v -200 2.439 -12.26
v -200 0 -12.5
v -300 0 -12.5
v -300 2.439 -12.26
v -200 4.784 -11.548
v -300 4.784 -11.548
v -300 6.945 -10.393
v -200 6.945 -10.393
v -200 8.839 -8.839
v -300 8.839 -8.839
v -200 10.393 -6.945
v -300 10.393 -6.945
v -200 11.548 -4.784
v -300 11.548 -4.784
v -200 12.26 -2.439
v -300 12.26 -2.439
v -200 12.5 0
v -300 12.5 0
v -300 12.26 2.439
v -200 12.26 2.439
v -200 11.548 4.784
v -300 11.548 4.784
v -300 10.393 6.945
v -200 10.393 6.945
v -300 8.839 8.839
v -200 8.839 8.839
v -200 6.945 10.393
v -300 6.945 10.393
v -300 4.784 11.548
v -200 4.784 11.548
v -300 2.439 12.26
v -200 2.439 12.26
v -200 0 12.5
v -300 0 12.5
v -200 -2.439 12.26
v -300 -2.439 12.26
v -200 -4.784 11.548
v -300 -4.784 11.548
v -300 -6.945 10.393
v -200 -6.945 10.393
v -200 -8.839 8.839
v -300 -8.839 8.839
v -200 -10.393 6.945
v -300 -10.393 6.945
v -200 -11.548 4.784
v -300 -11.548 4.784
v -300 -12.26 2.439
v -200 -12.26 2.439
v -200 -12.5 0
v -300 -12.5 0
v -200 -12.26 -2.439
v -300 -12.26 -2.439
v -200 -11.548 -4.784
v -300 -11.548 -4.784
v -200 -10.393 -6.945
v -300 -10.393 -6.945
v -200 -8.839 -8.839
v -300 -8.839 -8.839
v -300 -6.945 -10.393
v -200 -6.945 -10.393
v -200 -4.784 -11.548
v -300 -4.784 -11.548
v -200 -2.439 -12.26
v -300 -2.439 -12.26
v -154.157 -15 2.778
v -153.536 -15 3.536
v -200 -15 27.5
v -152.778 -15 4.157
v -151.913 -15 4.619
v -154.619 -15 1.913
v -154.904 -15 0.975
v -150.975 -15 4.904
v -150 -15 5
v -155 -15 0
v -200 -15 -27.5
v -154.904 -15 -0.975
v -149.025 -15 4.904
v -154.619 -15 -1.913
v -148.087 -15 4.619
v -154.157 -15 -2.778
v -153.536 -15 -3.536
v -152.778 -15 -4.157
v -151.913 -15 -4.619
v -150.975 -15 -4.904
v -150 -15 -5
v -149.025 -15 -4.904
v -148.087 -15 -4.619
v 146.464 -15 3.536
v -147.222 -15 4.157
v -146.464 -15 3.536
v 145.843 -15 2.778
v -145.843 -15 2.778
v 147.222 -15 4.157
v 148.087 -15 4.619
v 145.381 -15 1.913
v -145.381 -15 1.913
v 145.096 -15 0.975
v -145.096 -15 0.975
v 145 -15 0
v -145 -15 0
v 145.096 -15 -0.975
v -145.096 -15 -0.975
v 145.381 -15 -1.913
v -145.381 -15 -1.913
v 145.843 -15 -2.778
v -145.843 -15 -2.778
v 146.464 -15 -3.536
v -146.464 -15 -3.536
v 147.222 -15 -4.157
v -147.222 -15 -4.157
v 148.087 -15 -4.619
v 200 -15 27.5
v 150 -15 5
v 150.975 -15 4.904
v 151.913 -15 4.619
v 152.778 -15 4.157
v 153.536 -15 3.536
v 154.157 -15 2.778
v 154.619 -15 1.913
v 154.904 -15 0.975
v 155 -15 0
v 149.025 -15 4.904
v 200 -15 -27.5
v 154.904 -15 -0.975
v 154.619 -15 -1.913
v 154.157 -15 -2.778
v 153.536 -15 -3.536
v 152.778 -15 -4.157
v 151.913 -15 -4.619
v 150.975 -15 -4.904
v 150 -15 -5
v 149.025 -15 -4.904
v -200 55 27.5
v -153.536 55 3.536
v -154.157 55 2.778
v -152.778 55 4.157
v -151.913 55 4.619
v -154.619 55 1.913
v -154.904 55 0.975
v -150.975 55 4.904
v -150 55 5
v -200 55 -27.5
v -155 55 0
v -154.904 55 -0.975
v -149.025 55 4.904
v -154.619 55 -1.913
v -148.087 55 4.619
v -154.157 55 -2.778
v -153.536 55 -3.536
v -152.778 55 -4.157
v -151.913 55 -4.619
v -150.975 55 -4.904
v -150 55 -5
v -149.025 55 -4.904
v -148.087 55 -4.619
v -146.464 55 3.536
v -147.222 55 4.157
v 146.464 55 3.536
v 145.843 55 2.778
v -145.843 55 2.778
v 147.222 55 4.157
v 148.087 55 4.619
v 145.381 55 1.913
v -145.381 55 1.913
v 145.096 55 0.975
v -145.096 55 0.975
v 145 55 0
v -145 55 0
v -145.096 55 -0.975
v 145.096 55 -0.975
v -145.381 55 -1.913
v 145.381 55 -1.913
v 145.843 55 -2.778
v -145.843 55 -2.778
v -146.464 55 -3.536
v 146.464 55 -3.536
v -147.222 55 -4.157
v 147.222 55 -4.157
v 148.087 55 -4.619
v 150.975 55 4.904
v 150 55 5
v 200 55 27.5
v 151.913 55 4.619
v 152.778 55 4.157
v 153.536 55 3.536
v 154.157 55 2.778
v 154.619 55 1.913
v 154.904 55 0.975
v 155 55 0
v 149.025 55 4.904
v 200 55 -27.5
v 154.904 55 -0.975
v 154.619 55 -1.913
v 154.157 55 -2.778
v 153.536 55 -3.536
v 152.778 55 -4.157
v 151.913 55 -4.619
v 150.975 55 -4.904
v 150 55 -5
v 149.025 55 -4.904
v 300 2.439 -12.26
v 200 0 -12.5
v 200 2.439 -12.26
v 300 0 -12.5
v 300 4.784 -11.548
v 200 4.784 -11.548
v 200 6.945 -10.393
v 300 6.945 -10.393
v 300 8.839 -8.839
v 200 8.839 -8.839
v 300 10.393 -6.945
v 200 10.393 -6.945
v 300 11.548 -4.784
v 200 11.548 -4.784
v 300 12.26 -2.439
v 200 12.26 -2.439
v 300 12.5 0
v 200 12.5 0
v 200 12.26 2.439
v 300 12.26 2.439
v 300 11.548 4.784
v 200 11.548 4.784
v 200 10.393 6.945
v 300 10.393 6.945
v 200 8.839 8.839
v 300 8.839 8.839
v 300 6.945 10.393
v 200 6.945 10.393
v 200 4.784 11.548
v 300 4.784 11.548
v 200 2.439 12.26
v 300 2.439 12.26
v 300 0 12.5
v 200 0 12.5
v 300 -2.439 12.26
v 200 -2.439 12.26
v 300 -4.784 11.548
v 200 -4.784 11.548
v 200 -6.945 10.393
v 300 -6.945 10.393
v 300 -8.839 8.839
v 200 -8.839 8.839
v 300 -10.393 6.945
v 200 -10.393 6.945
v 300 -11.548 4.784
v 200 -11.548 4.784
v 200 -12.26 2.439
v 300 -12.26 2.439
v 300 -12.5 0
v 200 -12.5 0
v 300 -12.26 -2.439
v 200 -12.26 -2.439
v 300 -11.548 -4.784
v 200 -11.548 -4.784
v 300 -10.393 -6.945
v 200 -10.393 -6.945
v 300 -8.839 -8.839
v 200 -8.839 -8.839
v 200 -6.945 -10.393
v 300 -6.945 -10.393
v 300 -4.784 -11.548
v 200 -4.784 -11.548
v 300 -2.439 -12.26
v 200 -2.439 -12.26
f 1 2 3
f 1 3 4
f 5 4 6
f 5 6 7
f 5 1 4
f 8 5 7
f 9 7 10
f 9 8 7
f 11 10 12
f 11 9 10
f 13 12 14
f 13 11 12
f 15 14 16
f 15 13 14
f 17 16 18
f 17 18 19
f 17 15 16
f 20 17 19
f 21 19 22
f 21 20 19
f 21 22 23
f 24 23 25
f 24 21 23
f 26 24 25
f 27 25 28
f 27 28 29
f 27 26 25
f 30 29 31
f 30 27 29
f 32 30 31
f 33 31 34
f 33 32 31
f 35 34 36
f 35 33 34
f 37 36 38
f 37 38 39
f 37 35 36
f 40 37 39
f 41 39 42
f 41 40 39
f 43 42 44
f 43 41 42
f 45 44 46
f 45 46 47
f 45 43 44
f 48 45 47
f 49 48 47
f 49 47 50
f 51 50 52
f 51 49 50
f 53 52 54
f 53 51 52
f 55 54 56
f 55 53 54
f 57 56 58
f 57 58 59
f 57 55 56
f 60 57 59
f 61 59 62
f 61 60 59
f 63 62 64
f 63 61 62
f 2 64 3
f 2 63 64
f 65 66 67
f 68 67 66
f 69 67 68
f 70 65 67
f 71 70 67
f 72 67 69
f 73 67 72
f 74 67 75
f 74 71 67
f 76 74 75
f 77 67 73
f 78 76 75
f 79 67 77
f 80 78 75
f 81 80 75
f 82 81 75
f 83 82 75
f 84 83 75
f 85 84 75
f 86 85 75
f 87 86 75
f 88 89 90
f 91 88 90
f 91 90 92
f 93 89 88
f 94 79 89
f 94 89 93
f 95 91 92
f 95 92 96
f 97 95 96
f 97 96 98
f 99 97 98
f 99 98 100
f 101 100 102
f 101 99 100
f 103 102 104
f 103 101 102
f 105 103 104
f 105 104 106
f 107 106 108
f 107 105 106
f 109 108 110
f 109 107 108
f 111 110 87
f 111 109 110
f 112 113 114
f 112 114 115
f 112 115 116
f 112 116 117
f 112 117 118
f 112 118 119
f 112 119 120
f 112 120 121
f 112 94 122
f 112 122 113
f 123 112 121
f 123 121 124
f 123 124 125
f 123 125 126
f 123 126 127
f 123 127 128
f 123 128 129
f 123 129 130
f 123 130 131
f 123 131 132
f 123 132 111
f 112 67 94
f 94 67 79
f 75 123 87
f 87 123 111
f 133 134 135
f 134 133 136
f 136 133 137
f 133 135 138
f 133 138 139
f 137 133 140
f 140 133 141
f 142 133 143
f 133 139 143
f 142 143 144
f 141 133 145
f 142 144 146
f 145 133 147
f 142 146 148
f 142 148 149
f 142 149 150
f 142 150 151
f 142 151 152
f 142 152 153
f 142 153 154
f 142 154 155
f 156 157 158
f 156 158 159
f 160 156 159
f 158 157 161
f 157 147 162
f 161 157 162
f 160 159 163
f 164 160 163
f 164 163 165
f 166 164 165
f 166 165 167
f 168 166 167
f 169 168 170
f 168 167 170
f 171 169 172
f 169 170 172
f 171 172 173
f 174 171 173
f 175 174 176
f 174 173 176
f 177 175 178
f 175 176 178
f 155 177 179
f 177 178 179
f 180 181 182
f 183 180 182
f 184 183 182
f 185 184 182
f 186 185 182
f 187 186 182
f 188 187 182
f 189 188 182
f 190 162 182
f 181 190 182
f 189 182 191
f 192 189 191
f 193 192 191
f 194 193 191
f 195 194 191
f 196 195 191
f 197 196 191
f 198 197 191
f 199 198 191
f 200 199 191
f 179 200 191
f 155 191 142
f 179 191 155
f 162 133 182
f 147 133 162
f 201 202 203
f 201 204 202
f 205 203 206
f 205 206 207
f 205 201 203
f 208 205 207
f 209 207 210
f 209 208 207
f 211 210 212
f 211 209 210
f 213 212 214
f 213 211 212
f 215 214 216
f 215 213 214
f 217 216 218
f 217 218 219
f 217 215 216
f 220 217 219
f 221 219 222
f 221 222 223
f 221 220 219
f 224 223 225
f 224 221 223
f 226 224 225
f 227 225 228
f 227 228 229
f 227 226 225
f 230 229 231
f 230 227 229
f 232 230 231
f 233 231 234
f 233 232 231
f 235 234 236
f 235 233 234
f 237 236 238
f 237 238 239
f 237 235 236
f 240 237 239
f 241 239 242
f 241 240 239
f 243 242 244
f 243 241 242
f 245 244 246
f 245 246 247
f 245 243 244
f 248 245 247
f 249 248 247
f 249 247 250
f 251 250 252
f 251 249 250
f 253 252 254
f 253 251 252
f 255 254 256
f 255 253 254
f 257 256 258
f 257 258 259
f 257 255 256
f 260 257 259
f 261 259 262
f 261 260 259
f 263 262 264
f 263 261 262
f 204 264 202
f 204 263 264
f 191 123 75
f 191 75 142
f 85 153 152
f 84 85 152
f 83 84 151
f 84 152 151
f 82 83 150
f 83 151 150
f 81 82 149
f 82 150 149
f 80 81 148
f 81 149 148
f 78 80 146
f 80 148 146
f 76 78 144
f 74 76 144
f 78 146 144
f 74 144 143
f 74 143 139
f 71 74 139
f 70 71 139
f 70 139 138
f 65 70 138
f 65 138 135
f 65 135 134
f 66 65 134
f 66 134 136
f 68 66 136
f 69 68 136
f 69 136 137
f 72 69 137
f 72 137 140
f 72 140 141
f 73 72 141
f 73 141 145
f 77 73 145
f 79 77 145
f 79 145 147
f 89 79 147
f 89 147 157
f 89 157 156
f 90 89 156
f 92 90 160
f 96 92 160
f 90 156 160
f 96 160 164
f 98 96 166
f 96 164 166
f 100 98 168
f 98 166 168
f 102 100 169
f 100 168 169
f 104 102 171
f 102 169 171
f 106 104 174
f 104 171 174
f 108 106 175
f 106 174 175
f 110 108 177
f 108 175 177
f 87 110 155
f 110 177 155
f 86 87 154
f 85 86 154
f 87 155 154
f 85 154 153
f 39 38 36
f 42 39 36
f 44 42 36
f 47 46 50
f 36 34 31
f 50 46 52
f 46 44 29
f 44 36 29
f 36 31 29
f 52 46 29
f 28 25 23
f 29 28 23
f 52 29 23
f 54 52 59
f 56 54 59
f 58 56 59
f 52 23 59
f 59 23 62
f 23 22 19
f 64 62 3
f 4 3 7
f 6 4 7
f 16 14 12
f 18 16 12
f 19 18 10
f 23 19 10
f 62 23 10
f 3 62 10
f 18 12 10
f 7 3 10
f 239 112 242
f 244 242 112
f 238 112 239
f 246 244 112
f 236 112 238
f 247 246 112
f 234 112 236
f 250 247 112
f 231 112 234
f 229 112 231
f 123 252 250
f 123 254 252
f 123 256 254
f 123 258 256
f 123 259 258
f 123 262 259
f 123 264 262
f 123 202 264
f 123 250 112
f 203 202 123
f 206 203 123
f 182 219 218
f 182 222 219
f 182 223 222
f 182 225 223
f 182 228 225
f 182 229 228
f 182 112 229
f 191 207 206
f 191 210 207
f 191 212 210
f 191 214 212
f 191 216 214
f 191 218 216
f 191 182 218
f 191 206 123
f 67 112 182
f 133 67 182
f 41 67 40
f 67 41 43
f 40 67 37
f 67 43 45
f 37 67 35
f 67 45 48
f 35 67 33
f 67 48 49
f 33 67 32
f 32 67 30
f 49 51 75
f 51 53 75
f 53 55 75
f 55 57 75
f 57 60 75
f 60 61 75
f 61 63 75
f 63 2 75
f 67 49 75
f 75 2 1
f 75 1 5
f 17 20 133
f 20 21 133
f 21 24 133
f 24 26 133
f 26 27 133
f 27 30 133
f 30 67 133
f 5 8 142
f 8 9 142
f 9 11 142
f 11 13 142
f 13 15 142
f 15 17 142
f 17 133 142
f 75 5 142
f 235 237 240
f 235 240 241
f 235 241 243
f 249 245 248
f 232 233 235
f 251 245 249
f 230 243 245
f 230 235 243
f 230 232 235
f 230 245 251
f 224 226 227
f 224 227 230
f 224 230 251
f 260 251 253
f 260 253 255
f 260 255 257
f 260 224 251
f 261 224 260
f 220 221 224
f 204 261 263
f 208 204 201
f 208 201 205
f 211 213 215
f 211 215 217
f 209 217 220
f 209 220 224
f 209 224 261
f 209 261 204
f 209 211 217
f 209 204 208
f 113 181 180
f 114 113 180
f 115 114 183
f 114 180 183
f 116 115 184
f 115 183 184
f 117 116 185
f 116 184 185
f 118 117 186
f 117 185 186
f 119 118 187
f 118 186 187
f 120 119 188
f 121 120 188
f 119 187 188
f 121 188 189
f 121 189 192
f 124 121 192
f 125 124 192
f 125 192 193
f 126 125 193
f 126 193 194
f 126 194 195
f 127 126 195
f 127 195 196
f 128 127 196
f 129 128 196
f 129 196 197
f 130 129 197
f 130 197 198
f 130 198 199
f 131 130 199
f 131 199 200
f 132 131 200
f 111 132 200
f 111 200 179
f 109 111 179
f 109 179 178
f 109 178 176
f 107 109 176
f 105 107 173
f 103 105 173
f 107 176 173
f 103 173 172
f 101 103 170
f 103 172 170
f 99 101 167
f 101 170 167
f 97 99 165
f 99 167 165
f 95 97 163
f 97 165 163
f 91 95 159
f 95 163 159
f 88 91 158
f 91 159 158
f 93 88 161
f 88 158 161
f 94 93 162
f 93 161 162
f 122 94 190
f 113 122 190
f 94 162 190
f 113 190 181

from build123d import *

# Parameters (mm, degrees)
SKETCH2_R           = 12.5
BOSS_EXTRUDE1_DEPTH = 300
SKETCH3_W           = 55
SKETCH3_H           = 70
BOSS_EXTRUDE2_DEPTH = 200
SKETCH4_R           = 5
CUT_EXTRUDE1_DEPTH  = 310.283446049


with BuildPart() as part:
    # Sketch2 → Boss-Extrude1 (new, symmetric)
    with BuildSketch(Plane(origin=(0, 0, 0), x_dir=(0, 0, -1), z_dir=(1, 0, 0))):
        Circle(SKETCH2_R)
    extrude(amount=BOSS_EXTRUDE1_DEPTH, both=True)

    # Sketch3 → Boss-Extrude2 (add, symmetric)
    with BuildSketch(Plane(origin=(0, 0, 0), x_dir=(0, 0, -1), z_dir=(1, 0, 0))):
        with Locations((0, 20)):
            Rectangle(SKETCH3_W, SKETCH3_H)
    extrude(amount=BOSS_EXTRUDE2_DEPTH, both=True)

    # Sketch4 → Cut-Extrude1 (cut, through all)
    with BuildSketch(Plane(origin=(0, 55, 0), x_dir=(1, 0, 0), z_dir=(0, 1, 0))):
        with Locations(Location((150, 0, 0), (0, 0, 270))):
            Circle(SKETCH4_R)
        with Locations(Location((-150, 0, 0), (0, 0, 90))):
            Circle(SKETCH4_R)
    extrude(amount=-CUT_EXTRUDE1_DEPTH, mode=Mode.SUBTRACT)


solid = part.part
